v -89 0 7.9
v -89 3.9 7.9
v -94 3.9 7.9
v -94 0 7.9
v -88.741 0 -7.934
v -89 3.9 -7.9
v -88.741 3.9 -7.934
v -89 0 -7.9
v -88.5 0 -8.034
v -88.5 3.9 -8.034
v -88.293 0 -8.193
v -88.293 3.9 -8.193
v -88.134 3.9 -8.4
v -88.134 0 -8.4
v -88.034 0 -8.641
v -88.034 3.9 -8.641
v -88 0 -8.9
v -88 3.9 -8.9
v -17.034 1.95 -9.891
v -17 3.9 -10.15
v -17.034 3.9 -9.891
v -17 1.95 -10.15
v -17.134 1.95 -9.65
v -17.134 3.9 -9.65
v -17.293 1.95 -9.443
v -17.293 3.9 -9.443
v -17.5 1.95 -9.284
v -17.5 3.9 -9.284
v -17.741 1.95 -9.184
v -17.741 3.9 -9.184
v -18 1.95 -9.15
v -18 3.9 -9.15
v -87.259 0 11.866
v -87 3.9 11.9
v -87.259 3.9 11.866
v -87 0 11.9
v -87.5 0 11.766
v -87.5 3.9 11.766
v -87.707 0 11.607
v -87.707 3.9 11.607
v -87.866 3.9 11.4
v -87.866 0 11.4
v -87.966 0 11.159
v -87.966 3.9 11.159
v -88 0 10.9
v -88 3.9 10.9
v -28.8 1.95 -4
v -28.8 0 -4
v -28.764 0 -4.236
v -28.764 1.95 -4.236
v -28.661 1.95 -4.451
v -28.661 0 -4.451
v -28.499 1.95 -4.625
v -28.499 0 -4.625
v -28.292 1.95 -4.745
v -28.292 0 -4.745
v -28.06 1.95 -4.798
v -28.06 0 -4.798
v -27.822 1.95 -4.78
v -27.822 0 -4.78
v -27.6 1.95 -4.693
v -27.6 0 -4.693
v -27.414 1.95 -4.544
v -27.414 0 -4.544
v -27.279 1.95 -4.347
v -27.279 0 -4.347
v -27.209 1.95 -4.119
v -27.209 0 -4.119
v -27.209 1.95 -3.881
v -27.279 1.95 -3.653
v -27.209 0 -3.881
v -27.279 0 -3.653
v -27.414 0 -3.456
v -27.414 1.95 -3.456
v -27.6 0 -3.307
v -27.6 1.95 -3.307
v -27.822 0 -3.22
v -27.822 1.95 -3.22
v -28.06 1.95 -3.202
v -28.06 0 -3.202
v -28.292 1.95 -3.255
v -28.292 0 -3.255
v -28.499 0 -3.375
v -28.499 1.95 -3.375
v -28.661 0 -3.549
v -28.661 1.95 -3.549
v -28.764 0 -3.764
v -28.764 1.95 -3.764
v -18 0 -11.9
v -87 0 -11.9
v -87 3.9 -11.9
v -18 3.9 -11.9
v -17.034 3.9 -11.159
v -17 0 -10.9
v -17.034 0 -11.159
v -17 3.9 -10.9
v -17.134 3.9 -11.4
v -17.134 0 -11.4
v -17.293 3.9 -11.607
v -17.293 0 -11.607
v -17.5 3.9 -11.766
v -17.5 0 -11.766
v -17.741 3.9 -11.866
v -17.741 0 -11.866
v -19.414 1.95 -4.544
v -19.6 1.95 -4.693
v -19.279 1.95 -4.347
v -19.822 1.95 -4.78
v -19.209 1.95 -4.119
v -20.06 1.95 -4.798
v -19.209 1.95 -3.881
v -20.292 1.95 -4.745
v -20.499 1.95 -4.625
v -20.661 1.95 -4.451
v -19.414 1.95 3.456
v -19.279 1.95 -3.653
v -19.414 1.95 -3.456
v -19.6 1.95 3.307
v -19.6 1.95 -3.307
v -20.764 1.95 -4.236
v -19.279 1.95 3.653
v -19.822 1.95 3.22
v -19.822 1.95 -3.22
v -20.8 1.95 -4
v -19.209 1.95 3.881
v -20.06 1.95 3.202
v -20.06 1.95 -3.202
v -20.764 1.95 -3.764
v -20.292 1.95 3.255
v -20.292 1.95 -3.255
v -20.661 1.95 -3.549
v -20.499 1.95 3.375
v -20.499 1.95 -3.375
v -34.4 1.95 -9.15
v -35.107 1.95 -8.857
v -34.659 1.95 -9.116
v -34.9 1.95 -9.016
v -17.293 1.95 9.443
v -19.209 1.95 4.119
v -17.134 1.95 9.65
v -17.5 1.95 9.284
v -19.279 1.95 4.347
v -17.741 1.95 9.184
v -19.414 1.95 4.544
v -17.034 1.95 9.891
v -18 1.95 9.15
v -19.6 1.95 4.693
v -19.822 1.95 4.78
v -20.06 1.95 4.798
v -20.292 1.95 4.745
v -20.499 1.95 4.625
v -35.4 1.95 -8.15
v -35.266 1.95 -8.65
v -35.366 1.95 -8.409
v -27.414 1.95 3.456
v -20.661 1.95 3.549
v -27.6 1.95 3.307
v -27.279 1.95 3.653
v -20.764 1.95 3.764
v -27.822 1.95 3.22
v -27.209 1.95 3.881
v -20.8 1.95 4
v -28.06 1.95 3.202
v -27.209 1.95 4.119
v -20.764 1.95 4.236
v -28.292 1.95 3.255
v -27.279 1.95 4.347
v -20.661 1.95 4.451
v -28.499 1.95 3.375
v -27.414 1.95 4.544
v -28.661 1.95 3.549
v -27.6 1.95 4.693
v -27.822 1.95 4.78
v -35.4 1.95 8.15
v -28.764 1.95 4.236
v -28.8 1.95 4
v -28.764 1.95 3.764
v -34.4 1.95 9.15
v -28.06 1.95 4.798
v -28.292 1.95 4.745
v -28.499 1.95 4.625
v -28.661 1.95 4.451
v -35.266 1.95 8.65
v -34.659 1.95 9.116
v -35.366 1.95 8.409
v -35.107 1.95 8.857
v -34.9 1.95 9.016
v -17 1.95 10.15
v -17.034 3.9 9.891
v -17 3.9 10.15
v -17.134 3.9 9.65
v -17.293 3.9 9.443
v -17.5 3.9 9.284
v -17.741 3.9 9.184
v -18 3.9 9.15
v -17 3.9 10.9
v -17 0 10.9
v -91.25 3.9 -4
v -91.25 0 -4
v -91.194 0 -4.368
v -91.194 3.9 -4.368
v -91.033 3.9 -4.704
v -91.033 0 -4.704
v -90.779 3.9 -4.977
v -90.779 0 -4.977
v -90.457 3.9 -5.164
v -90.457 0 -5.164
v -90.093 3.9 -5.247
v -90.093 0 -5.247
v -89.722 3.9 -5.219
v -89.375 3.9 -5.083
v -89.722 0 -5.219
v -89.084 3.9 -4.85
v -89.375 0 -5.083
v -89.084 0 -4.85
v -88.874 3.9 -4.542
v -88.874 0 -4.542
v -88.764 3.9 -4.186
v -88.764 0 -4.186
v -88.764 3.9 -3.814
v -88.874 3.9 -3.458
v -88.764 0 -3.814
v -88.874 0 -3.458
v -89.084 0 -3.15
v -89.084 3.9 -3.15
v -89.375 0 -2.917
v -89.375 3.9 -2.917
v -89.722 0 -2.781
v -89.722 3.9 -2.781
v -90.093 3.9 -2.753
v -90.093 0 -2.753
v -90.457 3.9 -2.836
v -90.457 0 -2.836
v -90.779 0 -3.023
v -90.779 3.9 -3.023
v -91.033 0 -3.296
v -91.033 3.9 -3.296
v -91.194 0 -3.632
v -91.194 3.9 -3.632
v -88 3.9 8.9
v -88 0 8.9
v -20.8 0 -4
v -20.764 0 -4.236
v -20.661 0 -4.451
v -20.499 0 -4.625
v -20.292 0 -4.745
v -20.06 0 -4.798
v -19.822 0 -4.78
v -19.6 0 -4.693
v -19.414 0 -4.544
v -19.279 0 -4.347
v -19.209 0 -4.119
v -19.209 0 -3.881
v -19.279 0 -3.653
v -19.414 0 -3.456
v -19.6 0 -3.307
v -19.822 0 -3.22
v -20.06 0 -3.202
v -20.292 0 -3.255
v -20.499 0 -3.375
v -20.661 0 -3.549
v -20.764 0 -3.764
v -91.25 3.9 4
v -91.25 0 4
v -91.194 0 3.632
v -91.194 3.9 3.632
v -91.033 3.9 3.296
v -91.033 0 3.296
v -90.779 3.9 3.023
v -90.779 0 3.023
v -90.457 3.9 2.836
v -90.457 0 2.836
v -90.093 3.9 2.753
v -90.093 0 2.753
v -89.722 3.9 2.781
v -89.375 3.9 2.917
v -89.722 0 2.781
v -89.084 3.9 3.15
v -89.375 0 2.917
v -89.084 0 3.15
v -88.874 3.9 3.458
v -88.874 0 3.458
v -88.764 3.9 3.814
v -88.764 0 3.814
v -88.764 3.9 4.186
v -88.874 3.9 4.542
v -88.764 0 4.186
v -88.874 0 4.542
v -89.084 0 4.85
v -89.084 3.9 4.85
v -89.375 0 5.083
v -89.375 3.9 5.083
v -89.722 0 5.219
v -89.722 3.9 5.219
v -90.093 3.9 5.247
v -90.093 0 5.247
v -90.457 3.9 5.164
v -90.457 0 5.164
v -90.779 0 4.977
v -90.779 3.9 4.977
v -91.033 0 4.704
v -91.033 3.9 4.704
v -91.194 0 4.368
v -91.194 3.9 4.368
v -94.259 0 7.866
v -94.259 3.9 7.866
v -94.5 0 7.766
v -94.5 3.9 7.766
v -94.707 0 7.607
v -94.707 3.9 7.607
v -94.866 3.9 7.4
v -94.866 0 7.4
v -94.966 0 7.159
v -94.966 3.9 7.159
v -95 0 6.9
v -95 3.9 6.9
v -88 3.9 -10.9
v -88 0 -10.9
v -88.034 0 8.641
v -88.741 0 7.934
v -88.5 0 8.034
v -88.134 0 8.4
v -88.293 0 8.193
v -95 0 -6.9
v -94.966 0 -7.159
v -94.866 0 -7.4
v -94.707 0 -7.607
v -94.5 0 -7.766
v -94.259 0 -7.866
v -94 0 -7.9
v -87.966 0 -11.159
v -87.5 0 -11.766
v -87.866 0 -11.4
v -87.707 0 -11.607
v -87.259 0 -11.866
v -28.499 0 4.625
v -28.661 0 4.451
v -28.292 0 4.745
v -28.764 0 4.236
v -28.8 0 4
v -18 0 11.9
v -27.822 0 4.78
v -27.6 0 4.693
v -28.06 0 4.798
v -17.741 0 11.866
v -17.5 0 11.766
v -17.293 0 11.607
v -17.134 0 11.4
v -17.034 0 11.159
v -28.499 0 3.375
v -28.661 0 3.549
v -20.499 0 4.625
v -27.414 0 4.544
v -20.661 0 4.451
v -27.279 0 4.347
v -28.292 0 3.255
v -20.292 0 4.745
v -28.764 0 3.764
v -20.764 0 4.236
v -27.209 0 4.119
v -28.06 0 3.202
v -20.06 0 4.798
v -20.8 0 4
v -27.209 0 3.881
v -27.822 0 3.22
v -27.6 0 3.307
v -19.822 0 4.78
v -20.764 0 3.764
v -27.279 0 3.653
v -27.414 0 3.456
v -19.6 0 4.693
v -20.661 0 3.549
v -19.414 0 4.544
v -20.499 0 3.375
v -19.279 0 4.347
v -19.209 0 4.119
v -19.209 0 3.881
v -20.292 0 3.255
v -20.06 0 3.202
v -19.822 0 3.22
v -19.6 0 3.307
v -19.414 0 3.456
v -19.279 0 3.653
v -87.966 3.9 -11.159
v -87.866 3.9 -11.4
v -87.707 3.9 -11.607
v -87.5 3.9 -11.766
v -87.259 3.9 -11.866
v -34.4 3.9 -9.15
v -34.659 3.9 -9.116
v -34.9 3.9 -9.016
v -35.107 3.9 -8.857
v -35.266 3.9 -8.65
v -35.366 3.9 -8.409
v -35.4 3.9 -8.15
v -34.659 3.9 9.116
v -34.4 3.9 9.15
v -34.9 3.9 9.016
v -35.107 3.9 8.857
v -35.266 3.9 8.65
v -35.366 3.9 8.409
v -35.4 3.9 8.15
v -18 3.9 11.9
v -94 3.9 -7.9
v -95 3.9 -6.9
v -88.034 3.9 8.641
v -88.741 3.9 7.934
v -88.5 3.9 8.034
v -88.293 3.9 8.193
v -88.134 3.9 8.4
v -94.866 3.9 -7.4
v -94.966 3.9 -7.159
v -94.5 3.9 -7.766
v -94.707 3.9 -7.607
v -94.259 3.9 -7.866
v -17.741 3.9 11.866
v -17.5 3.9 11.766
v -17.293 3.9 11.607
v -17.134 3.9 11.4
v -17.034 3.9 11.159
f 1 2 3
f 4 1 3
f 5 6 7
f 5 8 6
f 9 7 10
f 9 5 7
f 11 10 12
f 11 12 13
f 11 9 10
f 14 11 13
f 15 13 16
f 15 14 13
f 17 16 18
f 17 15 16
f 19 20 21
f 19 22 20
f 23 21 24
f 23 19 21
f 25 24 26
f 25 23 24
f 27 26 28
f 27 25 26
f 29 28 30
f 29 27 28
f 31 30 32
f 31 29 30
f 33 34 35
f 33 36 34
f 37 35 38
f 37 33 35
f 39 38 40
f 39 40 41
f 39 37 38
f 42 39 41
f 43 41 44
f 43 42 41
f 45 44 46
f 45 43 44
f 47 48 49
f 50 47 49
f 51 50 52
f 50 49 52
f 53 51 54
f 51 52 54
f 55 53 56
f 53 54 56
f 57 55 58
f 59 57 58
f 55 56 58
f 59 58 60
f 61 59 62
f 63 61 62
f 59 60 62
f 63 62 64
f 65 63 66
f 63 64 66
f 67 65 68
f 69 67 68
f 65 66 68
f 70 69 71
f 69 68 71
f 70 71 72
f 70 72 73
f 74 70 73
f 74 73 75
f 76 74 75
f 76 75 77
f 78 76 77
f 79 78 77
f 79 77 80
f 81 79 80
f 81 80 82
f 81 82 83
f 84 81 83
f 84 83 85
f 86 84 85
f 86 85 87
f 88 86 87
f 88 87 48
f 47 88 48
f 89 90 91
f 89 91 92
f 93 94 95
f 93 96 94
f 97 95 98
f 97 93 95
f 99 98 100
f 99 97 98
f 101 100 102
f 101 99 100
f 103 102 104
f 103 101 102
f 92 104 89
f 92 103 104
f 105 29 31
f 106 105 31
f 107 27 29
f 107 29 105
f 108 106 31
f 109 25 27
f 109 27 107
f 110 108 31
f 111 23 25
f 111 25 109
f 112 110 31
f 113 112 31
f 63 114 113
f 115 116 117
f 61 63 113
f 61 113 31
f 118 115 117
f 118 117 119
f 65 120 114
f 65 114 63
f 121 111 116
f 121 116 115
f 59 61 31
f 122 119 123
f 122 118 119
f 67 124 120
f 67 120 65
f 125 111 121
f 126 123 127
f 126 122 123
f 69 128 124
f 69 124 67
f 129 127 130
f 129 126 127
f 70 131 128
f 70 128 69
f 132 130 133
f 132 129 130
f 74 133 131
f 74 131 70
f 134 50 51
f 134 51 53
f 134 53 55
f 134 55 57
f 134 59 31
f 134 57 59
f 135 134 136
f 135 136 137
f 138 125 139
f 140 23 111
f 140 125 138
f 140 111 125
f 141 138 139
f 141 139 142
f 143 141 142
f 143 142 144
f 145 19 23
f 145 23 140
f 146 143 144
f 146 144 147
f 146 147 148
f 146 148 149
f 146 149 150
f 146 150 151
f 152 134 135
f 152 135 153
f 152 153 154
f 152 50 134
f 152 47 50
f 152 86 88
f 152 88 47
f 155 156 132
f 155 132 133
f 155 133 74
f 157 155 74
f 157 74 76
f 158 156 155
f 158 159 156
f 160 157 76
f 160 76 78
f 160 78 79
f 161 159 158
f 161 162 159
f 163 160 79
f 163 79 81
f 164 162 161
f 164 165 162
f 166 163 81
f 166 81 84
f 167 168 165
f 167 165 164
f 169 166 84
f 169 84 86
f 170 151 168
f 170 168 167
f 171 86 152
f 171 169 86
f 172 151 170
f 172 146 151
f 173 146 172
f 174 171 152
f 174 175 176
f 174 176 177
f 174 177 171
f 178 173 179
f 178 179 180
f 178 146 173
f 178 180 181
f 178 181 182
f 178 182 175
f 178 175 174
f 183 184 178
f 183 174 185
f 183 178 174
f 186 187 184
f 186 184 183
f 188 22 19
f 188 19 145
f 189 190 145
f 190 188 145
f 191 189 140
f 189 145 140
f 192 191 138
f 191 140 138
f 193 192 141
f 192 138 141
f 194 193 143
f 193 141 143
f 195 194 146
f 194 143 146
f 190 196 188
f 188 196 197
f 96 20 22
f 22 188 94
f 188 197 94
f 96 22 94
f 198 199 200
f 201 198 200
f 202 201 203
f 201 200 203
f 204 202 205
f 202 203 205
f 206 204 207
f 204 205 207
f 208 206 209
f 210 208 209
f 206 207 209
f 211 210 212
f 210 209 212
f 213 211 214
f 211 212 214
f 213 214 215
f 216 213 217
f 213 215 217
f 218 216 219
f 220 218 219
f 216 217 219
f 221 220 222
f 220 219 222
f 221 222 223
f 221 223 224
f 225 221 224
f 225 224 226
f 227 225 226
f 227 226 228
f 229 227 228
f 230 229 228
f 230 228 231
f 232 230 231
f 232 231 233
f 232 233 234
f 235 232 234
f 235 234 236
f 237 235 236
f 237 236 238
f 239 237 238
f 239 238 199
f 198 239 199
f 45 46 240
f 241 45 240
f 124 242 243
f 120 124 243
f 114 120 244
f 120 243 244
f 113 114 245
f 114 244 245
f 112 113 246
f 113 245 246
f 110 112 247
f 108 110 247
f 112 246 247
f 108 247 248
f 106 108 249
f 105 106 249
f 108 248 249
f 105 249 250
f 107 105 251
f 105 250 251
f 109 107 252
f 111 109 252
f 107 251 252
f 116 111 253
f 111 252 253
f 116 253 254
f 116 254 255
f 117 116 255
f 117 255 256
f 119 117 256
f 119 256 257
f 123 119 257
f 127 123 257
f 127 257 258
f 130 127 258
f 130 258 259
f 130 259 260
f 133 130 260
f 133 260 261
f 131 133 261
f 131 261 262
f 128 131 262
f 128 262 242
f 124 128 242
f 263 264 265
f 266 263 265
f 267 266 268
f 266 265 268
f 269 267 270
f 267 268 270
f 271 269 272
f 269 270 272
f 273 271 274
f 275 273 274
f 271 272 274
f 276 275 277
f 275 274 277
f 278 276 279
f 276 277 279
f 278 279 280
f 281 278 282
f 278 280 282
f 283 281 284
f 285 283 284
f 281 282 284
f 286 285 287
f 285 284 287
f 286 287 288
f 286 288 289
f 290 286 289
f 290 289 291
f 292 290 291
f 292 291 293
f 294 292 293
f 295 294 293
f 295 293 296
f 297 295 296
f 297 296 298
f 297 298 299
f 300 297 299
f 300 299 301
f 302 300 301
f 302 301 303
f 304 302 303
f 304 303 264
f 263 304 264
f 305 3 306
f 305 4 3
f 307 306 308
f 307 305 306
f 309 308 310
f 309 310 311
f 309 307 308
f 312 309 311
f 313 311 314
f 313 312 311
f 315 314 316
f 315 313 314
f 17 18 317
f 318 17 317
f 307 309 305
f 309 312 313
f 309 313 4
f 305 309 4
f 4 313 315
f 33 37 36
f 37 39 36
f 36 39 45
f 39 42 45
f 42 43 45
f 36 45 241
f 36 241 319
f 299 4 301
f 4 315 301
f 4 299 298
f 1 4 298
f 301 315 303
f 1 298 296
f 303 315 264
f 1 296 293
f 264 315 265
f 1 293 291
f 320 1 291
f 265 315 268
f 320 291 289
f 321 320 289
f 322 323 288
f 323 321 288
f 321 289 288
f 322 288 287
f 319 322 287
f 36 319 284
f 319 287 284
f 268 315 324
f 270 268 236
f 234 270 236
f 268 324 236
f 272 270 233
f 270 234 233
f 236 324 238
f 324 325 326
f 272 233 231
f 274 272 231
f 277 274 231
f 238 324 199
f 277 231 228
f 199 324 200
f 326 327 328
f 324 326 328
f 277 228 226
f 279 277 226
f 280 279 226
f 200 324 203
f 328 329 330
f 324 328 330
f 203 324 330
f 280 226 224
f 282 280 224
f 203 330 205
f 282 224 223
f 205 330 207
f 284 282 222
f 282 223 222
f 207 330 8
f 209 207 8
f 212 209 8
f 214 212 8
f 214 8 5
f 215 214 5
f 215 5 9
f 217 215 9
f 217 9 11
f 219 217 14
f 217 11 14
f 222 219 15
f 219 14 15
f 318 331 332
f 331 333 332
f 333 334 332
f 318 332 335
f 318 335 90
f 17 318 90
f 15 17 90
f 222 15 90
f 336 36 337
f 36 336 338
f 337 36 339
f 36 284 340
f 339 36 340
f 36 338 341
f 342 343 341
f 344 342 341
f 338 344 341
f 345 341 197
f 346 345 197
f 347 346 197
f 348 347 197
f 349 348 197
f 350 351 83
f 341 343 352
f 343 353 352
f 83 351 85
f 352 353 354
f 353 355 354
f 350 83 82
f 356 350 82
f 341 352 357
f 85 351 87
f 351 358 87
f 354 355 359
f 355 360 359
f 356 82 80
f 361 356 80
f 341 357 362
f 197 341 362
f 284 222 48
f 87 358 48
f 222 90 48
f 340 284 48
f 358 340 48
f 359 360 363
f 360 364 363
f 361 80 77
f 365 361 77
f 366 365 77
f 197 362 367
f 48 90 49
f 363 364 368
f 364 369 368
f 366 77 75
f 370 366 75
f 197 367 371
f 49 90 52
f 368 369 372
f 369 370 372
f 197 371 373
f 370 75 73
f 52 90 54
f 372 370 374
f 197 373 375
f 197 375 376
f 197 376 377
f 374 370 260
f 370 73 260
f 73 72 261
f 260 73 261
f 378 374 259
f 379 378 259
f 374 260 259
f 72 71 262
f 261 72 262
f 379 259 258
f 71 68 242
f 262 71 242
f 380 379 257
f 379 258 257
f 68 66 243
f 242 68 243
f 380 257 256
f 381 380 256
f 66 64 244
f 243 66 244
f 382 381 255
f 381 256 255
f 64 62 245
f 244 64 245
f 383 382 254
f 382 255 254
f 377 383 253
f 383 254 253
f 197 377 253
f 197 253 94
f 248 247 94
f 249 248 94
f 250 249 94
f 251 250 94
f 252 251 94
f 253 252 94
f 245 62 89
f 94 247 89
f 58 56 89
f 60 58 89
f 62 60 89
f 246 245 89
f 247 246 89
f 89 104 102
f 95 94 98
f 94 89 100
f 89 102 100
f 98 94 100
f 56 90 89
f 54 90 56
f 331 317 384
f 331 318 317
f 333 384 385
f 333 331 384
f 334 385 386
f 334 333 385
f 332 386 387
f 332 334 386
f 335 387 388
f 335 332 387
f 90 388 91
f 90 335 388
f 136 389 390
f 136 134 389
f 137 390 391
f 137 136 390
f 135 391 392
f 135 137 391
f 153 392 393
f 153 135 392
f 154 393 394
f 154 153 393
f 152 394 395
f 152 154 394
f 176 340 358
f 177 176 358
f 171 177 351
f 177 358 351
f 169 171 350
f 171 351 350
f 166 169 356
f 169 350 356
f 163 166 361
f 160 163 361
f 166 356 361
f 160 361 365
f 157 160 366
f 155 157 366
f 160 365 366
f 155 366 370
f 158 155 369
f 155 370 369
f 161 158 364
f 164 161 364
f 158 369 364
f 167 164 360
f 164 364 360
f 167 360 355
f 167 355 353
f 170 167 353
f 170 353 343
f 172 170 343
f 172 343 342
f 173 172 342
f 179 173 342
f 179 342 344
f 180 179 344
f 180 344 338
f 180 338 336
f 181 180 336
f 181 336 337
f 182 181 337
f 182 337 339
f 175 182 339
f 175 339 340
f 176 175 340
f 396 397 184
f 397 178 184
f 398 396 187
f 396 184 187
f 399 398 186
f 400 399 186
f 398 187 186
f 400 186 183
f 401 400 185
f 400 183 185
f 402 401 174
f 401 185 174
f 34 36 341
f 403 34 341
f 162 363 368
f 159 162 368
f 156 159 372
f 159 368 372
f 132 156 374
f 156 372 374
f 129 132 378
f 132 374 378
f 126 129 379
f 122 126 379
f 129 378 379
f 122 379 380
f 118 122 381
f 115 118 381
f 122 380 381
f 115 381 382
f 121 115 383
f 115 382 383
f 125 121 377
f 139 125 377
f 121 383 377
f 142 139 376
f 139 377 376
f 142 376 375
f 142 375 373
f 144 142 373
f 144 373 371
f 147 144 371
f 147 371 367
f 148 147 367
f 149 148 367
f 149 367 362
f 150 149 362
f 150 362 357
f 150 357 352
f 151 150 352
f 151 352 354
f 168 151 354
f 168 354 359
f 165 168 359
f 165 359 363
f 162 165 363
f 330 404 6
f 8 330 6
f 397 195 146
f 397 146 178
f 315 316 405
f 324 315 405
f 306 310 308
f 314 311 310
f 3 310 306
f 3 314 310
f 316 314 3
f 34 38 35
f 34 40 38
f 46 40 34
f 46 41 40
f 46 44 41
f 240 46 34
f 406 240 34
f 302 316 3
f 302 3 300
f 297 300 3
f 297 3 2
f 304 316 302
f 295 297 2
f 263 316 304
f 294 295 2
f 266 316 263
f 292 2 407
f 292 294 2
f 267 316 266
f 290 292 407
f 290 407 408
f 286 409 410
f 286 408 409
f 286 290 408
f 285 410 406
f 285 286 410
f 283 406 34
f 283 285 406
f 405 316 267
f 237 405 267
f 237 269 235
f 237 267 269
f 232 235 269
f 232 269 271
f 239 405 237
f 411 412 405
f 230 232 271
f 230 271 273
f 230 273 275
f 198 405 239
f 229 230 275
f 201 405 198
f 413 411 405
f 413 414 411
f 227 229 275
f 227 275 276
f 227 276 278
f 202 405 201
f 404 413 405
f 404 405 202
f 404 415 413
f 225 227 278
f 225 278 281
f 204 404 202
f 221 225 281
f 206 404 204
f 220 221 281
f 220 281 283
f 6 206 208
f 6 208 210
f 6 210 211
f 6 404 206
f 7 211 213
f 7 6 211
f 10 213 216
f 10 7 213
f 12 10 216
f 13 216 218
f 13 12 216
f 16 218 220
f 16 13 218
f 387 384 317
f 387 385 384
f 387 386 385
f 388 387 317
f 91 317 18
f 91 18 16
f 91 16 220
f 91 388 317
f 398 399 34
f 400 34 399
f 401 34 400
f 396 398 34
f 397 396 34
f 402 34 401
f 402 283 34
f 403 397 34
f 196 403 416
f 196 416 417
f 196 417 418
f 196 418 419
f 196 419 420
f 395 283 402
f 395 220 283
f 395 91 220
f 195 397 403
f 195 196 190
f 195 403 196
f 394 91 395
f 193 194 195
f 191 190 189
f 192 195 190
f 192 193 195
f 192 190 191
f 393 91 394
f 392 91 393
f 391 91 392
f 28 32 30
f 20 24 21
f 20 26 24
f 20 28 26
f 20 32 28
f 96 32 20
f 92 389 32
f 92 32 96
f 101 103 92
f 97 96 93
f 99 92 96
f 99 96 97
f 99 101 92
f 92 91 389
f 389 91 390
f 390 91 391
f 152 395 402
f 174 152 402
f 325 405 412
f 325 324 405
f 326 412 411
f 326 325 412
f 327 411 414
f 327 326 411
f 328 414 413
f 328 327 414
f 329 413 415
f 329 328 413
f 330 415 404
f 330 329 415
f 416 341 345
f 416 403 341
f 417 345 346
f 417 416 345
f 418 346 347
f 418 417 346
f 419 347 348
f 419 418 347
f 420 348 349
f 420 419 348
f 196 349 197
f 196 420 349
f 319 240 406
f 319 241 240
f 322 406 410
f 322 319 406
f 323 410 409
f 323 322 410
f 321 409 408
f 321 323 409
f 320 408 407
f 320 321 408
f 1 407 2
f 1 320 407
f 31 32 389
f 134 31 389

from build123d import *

# Parameters (mm, degrees)
SKETCH5_W            = 82
SKETCH5_H            = 23.8
BOSS_EXTRUDE1_DEPTH  = 3.9
M2_TAPPED_HOLE1_D    = 1.6
LPATTERN1_COUNT      = 2
LPATTERN1_PITCH      = 8
LPATTERN1_COUNT_DIR2 = 2
LPATTERN1_PITCH_DIR2 = 8
CUT_EXTRUDE2_START   = 3.9
REF_JOIN_CUT_FRONT_W = 18.4
REF_JOIN_CUT_FRONT_H = 18.3
CUT_EXTRUDE2_DEPTH   = 1.95
M3_TAPPED_HOLE2_D    = 2.5
LPATTERN2_COUNT      = 2
LPATTERN2_PITCH      = 8
CUT_EXTRUDE4_DEPTH   = 100.788877136
FILLET4_R            = 1
FILLET6_R            = 1


with BuildPart() as part:
    # Sketch5 → Boss-Extrude1 (new body)
    with BuildSketch(Plane(origin=(0, 0, 0), x_dir=(1, 0, 0), z_dir=(0, 1, 0))):
        with Locations((-58, 0)):
            Rectangle(SKETCH5_W, SKETCH5_H)
    extrude(amount=BOSS_EXTRUDE1_DEPTH)

    # M2 Tapped Hole1 (through all)
    with Locations(Plane(origin=(0, 3.9, 0), x_dir=(1, 0, 0), z_dir=(0, 1, 0))):
        with Locations((-20, 4)):
            m2_tapped_hole1 = Hole(M2_TAPPED_HOLE1_D / 2)

    # LPattern1: M2 Tapped Hole1 2 × 2
    with Locations(*[(-j * LPATTERN1_PITCH_DIR2, 0, i * LPATTERN1_PITCH) for i in range(LPATTERN1_COUNT) for j in range(LPATTERN1_COUNT_DIR2) if (i, j) != (0, 0)]):
        add(m2_tapped_hole1, mode=Mode.SUBTRACT)

    # Ref join cut, Front → Cut-Extrude2 (cut)
    with BuildSketch(Plane(origin=(0, 0, 0), x_dir=(-1, 0, 0), z_dir=(0, 1, 0)).offset(CUT_EXTRUDE2_START)):
        with Locations((26.2, 0)):
            Rectangle(REF_JOIN_CUT_FRONT_W, REF_JOIN_CUT_FRONT_H)
    extrude(amount=-CUT_EXTRUDE2_DEPTH, mode=Mode.SUBTRACT)

    # M3 Tapped Hole2 (through all)
    with Locations(Plane(origin=(0, 3.9, 0), x_dir=(1, 0, 0), z_dir=(0, 1, 0))):
        with Locations((-90, 4)):
            m3_tapped_hole2 = Hole(M3_TAPPED_HOLE2_D / 2)

    # LPattern2: M3 Tapped Hole2 ×2
    with Locations(*[(0, 0, i * LPATTERN2_PITCH) for i in range(1, LPATTERN2_COUNT)]):
        add(m3_tapped_hole2, mode=Mode.SUBTRACT)

    # Sketch13 → Cut-Extrude4 (cut, through all)
    with BuildSketch(Plane(origin=(0, 3.9, 0), x_dir=(1, 0, 0), z_dir=(0, 1, 0))):
        Polygon((-88, -11.9), (-88, -7.9), (-95, -7.9), (-95, 7.9), (-88, 7.9), (-88, 11.9), (-99, 11.9), (-99, -11.9), align=None)
    extrude(amount=-CUT_EXTRUDE4_DEPTH, mode=Mode.SUBTRACT)

    # Fillet4
    fillet4_edges = [part.edges().sort_by_distance(p)[0] for p in [
        (-88, 1.95, 11.9),
        (-88, 1.95, -11.9),
        (-88, 1.95, -7.9),
        (-95, 1.95, -7.9),
        (-95, 1.95, 7.9),
        (-88, 1.95, 7.9),
    ]]
    fillet(fillet4_edges, radius=FILLET4_R)

    # Fillet6
    fillet6_edges = [part.edges().sort_by_distance(p)[0] for p in [
        (-35.4, 2.925, -9.15),
        (-17, 2.925, -9.15),
        (-17, 2.925, 9.15),
        (-35.4, 2.925, 9.15),
        (-17, 1.95, -11.9),
        (-17, 1.95, 11.9),
    ]]
    fillet(fillet6_edges, radius=FILLET6_R)


solid = part.part
